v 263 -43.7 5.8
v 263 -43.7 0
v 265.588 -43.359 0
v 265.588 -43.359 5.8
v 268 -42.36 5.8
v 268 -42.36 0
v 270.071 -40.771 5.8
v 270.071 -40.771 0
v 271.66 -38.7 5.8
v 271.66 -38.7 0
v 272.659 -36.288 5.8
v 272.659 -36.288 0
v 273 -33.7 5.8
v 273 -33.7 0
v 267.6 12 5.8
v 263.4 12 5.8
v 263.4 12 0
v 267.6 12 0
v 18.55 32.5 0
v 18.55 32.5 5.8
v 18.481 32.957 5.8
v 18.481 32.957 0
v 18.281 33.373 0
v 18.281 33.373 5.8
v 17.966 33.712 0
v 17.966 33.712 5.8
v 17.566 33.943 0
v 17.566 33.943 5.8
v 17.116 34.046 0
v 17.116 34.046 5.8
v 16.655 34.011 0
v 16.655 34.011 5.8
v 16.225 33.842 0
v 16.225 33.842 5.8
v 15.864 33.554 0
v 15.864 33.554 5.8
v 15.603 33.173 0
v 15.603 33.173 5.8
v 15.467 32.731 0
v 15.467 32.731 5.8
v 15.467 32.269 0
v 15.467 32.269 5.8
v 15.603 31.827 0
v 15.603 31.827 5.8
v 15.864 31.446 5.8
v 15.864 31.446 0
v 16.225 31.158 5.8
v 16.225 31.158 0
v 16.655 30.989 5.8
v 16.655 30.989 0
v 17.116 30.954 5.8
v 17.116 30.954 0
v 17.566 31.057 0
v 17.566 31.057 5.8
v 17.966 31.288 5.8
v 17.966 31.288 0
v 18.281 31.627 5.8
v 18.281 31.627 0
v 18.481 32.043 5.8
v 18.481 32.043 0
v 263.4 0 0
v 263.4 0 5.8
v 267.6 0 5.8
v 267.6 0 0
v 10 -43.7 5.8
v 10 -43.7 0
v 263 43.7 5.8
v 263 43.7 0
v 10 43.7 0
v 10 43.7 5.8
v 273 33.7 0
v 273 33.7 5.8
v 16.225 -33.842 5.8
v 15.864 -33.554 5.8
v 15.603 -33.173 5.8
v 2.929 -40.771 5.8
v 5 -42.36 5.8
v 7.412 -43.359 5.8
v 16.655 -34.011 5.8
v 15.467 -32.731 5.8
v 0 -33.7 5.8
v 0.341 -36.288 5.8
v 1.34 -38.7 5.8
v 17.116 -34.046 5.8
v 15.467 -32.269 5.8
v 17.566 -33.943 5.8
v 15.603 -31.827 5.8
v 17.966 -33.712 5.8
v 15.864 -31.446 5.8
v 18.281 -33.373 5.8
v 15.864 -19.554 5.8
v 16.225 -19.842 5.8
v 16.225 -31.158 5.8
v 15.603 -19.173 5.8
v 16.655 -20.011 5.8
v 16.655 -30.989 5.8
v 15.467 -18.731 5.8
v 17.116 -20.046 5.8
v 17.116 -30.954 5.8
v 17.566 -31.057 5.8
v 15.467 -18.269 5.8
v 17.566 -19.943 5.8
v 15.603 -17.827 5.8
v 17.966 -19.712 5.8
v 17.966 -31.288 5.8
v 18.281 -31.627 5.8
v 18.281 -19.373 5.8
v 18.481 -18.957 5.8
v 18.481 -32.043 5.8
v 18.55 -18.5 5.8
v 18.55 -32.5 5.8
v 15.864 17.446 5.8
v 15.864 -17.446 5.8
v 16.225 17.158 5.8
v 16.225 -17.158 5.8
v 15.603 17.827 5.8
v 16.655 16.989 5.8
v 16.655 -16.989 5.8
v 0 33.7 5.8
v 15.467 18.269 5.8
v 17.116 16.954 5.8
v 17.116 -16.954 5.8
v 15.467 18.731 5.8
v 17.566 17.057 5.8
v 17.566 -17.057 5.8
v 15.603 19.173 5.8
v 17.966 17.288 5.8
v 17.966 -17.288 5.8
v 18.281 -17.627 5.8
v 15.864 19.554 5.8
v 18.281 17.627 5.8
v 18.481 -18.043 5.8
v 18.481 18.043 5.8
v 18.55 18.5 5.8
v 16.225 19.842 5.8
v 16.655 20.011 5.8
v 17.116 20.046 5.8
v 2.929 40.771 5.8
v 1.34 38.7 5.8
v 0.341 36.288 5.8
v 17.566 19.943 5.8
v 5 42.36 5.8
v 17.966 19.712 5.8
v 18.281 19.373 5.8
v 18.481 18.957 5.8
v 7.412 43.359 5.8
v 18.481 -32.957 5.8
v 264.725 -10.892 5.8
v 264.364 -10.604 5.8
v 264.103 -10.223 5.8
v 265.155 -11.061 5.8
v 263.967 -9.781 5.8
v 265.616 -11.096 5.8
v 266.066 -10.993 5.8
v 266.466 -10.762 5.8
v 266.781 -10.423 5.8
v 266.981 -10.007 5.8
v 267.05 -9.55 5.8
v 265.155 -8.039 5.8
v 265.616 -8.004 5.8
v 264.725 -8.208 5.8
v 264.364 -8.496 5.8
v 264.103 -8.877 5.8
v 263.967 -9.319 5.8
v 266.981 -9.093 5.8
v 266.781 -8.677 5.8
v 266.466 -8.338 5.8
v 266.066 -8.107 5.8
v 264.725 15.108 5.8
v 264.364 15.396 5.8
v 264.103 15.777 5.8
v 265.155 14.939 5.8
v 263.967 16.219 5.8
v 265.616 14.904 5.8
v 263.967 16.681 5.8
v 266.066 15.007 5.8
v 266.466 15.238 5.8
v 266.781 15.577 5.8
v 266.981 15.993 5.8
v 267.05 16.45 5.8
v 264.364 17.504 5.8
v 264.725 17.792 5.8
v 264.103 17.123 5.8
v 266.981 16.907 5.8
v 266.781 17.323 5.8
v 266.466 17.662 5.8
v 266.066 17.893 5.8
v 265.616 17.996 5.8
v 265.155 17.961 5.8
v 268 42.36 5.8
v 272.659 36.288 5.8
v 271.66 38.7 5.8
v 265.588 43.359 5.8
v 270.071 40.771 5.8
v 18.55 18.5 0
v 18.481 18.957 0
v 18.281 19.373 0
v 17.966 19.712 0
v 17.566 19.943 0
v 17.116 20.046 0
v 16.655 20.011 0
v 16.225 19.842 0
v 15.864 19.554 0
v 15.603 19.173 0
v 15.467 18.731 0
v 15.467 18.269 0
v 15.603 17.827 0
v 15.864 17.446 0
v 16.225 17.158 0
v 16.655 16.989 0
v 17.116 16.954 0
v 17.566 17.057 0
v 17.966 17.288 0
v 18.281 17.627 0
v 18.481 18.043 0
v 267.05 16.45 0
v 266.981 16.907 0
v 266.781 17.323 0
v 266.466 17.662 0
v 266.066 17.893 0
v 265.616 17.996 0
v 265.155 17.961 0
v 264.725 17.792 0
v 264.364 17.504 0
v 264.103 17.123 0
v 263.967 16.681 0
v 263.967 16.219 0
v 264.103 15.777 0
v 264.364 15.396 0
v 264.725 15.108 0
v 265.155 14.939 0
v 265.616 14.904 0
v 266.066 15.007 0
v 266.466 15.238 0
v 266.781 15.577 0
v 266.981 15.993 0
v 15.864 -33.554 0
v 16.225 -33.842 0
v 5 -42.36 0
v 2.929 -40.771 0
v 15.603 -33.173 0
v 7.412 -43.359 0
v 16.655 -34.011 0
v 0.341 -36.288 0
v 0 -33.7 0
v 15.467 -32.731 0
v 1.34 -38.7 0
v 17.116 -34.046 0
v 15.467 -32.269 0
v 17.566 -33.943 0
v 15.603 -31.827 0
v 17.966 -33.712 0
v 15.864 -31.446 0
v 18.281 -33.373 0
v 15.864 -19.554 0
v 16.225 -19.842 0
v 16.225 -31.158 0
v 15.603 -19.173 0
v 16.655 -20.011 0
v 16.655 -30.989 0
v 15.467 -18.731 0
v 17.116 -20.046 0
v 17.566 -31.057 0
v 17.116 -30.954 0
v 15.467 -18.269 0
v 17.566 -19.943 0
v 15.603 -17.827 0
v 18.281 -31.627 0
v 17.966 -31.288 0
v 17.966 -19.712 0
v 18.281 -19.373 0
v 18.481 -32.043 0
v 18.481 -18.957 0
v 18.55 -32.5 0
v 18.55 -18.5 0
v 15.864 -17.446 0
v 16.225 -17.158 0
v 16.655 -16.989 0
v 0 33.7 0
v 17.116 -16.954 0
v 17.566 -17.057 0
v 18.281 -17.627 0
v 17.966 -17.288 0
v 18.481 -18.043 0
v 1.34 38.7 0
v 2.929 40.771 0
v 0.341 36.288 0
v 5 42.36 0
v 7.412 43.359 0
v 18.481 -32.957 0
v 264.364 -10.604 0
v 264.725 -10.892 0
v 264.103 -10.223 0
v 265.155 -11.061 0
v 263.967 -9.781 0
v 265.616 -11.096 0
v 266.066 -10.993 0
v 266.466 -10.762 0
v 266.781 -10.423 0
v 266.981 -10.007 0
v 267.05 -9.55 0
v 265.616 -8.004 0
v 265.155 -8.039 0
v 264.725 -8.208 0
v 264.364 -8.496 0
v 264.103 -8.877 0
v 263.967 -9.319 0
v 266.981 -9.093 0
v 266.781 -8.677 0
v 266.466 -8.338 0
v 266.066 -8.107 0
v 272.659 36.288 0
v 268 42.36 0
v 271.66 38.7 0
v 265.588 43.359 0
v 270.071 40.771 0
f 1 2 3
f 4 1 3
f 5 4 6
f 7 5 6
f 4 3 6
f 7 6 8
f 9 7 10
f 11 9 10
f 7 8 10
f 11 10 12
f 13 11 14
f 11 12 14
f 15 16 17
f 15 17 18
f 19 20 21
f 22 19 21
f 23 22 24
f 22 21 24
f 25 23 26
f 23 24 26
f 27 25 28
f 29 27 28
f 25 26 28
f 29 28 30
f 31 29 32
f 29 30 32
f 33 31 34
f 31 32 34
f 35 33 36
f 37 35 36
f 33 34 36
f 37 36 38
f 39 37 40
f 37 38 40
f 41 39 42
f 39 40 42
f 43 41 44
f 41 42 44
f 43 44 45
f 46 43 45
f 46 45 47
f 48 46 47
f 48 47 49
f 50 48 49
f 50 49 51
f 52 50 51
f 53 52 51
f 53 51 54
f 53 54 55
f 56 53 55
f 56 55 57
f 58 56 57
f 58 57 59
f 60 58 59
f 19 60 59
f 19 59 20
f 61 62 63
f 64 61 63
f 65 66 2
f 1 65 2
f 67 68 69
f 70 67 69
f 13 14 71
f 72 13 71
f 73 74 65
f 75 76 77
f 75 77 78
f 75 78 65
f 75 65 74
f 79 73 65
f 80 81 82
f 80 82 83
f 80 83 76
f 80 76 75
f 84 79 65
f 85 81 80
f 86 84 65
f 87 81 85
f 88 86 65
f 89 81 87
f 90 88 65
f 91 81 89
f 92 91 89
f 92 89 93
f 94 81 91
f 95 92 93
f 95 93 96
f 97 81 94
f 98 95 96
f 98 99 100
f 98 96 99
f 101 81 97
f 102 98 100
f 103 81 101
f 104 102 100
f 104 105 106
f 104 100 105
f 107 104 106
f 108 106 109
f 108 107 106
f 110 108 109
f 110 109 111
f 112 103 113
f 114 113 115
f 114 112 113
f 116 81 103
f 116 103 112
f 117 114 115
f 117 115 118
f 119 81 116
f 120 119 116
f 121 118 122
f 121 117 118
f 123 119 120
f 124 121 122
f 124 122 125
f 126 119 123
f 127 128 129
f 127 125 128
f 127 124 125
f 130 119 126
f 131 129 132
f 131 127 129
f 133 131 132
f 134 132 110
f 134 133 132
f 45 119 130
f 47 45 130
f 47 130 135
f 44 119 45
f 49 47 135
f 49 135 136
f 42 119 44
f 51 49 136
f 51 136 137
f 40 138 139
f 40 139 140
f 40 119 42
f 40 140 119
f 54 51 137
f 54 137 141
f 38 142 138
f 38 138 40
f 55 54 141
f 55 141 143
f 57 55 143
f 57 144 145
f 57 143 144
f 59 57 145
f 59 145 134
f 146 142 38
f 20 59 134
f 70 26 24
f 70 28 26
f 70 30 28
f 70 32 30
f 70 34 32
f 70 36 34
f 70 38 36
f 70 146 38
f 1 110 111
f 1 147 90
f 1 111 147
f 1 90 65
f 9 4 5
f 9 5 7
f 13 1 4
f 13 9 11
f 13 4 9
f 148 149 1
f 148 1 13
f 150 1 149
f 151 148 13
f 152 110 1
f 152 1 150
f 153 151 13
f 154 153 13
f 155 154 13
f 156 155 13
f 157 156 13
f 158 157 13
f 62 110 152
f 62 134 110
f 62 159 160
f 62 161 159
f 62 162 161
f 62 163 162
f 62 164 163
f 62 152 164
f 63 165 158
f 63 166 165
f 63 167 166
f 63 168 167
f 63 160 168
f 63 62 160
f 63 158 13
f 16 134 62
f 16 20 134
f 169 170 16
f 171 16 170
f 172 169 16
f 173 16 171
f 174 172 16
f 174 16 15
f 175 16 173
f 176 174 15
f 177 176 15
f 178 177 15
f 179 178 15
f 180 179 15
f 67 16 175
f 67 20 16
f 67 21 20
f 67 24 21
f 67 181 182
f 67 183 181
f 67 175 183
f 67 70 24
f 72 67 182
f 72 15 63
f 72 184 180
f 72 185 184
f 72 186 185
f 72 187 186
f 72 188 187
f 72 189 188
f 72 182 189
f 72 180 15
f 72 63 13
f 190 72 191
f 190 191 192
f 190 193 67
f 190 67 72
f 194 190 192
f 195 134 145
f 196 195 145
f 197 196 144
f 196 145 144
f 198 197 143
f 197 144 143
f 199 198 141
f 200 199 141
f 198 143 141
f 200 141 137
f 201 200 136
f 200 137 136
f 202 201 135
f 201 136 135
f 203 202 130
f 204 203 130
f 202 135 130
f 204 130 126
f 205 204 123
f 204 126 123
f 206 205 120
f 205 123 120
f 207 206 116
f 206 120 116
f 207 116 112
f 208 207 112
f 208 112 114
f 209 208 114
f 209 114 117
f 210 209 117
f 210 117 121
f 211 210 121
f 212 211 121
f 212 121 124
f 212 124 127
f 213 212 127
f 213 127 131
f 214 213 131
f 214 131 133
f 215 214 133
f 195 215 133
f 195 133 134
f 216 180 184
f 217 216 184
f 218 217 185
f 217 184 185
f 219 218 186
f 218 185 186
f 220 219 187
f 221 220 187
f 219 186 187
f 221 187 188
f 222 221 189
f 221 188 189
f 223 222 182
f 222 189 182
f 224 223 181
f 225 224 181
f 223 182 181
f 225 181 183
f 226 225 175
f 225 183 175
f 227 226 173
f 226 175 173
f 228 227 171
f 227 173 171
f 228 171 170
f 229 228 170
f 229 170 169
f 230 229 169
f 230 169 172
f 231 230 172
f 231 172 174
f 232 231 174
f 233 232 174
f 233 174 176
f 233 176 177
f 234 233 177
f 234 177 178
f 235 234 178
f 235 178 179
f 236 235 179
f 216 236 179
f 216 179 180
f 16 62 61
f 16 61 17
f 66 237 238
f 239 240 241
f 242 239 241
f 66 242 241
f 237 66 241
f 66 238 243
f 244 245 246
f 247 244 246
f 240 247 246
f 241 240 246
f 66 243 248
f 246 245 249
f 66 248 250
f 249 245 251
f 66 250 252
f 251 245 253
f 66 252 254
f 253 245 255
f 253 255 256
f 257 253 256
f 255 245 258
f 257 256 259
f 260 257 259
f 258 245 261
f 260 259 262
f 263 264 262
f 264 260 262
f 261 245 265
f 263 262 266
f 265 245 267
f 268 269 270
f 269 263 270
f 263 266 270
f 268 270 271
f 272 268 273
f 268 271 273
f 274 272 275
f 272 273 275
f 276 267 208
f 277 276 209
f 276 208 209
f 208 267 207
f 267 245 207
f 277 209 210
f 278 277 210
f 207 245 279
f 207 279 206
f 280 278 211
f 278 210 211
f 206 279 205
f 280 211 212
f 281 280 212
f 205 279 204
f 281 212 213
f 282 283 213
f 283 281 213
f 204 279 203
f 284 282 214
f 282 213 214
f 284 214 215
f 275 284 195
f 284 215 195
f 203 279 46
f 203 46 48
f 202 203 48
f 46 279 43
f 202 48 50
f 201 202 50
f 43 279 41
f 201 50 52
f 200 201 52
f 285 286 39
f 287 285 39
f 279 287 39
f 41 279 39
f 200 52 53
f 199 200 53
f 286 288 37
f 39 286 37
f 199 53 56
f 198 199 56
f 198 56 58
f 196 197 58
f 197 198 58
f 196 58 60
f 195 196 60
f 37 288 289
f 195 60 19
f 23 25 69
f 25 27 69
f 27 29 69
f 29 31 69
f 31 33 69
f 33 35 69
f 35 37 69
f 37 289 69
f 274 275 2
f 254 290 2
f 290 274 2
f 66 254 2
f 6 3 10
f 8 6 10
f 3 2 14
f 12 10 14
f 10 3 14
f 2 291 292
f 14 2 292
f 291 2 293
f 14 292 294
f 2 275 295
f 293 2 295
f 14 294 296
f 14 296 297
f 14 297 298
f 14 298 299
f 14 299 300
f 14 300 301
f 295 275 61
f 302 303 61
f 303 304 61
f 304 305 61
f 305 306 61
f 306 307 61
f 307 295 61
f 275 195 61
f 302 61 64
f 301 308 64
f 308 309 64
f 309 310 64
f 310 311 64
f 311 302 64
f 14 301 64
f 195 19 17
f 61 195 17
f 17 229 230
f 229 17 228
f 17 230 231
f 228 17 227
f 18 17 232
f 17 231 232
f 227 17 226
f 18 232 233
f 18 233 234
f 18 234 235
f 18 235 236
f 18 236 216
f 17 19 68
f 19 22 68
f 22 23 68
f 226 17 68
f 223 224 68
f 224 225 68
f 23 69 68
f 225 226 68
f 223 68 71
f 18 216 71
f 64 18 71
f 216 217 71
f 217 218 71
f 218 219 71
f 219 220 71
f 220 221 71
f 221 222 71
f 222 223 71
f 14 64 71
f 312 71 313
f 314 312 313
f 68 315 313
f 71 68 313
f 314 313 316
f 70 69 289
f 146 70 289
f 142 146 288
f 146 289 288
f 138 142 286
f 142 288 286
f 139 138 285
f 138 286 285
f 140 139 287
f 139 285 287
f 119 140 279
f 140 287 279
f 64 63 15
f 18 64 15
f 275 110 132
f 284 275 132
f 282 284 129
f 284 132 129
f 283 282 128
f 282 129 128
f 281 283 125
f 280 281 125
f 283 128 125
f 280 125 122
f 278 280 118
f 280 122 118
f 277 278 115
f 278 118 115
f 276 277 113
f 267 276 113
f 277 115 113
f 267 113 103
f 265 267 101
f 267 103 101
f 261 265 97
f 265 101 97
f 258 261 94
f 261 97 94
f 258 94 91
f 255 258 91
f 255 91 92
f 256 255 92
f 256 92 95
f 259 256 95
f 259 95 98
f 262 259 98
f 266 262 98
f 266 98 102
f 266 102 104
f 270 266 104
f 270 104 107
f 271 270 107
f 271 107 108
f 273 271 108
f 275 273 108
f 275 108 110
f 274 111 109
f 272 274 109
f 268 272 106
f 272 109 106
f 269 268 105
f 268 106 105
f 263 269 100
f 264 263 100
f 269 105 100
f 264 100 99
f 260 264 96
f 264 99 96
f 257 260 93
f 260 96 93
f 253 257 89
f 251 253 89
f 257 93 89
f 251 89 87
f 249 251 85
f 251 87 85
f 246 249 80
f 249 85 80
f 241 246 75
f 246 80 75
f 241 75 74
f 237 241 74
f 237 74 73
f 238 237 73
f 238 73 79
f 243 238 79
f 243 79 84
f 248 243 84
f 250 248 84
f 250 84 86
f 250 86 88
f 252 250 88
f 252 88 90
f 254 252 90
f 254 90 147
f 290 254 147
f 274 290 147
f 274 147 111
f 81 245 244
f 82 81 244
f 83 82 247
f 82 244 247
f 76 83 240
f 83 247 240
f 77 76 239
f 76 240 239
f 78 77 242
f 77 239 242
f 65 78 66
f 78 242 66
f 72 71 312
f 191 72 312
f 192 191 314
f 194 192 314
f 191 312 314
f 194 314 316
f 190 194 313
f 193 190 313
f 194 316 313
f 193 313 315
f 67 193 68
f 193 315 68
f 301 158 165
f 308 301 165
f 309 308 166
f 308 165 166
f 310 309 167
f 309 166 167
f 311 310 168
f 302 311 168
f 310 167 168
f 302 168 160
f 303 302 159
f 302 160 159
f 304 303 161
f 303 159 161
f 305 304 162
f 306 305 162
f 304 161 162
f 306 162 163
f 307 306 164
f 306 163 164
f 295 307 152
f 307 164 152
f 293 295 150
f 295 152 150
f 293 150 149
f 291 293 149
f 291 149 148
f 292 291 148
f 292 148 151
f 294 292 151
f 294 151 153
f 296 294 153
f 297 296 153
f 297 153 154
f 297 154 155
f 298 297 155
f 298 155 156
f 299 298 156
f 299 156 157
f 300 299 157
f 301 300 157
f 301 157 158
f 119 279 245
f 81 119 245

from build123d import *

# Parameters (mm, degrees)
BOSS_EXTRUDE1_DEPTH = 5.8
SKETCH3_W           = 4.2
SKETCH3_H           = 12
CUT_EXTRUDE1_DEPTH  = 6.35
SKETCH4_R           = 1.55
CUT_EXTRUDE2_DEPTH  = 6.8
SKETCH5_R           = 1.55
CUT_EXTRUDE3_DEPTH  = 6.8


with BuildPart() as part:
    # Sketch2 → Boss-Extrude1 (new body)
    with BuildSketch(Plane.XY):
        with BuildLine():
            Line((263, 43.7), (10, 43.7))
            ThreePointArc((10, 43.7), (2.928932188, 40.771067812), (0, 33.7))
            Line((0, 33.7), (0, -33.7))
            ThreePointArc((0, -33.7), (2.928932188, -40.771067812), (10, -43.7))
            Line((10, -43.7), (263, -43.7))
            ThreePointArc((263, -43.7), (270.071067812, -40.771067812), (273, -33.7))
            Line((273, -33.7), (273, 33.7))
            ThreePointArc((273, 33.7), (270.071067812, 40.771067812), (263, 43.7))
        make_face()
    extrude(amount=BOSS_EXTRUDE1_DEPTH)

    # Sketch3 → Cut-Extrude1 (cut)
    with BuildSketch(Plane.XY.offset(5.8)):
        with Locations((265.5, 6)):
            Rectangle(SKETCH3_W, SKETCH3_H)
    extrude(amount=-CUT_EXTRUDE1_DEPTH, mode=Mode.SUBTRACT)

    # Sketch4 → Cut-Extrude2 (cut, through all)
    with BuildSketch(Plane.XY.offset(5.8)):
        with Locations((17, 32.5)):
            Circle(SKETCH4_R)
        with Locations((17, 18.5)):
            Circle(SKETCH4_R)
        with Locations((17, -18.5)):
            Circle(SKETCH4_R)
        with Locations((17, -32.5)):
            Circle(SKETCH4_R)
    extrude(amount=-CUT_EXTRUDE2_DEPTH, mode=Mode.SUBTRACT)

    # Sketch5 → Cut-Extrude3 (cut, through all)
    with BuildSketch(Plane.XY.offset(5.8)):
        with Locations((265.5, 16.45)):
            Circle(SKETCH5_R)
        with Locations((265.5, -9.55)):
            Circle(SKETCH5_R)
    extrude(amount=-CUT_EXTRUDE3_DEPTH, mode=Mode.SUBTRACT)


solid = part.part
